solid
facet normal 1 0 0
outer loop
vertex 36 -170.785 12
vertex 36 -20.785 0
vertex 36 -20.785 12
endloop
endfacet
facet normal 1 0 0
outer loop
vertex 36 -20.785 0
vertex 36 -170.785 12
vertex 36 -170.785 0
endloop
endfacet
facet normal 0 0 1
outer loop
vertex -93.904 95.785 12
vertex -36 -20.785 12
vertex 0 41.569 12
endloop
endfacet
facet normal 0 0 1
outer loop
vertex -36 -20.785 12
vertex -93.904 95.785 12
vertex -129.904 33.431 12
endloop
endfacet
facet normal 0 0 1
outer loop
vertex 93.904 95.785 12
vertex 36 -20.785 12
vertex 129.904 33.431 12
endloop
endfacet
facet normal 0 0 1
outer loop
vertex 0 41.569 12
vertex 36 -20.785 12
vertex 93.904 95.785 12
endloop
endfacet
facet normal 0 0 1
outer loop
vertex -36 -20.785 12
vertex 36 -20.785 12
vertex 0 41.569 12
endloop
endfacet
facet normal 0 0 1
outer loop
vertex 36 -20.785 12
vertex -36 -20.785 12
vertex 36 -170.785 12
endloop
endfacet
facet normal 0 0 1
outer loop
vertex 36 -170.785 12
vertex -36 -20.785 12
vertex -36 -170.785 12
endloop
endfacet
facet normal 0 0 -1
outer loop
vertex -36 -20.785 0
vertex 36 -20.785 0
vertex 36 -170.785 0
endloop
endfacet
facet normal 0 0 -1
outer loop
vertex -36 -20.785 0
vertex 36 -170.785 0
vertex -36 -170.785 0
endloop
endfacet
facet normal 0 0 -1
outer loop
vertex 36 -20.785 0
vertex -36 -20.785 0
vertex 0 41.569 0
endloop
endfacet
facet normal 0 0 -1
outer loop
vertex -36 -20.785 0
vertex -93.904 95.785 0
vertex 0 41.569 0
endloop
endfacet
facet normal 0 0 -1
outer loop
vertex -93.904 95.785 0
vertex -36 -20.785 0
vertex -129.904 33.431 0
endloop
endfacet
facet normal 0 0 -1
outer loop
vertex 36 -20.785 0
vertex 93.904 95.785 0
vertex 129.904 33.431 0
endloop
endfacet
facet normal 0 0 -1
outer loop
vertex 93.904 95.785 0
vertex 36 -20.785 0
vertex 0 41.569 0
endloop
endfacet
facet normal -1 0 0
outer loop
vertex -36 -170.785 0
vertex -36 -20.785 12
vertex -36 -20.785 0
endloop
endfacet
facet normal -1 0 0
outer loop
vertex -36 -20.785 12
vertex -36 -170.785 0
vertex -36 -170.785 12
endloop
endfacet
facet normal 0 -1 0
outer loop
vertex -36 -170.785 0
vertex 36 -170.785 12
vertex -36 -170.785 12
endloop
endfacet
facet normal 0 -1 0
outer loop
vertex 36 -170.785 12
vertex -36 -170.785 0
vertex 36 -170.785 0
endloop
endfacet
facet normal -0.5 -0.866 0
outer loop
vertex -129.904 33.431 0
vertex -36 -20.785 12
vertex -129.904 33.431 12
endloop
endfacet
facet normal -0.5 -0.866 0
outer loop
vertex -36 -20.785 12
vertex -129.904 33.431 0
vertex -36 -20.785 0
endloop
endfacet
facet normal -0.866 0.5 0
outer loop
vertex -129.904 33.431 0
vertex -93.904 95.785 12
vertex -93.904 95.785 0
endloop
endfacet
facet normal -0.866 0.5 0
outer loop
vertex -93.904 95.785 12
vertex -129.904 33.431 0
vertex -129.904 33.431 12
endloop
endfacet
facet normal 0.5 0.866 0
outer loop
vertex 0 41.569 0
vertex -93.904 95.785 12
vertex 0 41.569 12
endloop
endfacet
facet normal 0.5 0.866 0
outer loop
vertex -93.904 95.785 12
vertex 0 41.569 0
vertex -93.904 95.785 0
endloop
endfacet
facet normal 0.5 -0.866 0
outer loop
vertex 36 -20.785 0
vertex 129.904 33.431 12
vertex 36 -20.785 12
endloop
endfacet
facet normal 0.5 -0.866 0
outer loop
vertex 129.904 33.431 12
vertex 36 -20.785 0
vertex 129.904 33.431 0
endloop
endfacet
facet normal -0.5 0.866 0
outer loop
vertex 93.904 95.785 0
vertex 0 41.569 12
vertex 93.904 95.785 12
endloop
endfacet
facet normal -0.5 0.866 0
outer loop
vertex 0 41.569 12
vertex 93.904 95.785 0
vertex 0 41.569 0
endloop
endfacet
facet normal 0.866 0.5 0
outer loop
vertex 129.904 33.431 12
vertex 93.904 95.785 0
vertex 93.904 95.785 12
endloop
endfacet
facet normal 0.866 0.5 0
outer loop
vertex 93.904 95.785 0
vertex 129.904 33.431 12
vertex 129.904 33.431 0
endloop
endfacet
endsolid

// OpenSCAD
// file: dims.scad
function i2m(x)=x*25.4;
function ASA(alpha,a,beta) = ((a/sin(alpha))*sin(beta));
//echo("ASA(90, 19.05, 60) == 16.5, but was ", ASA(90,19.05,60));

//Table Height
dim_tableHeight = i2m(29);

//Table Length
dim_tableLength = 2800;

// Table Width
dim_tableWidth = 1000;

// Table top
dim_tableTop = 20;

// Leg gap
dim_legGap = 1800;

// Ply Thickness
dim_ply = 12;

// Ply stack
qty_ply = 6;

//Critical dim
dim_critical = dim_ply * qty_ply;

//Vertical angle
ang_vertical = 10;

//Base thickness
dim_thickness = 80;

//Horizontal angle
ang_horizontal = 120;

// base extension
dim_baseExtension = ASA(ang_horizontal / 2 , dim_critical / 2, 90 - (ang_horizontal / 2 ));

// y brace
dim_yBrace = 150;

// Lower leg length
dim_lowerLeg = 360;

// Lower rad
rad_lower = 100;

// Upper rad
rad_upper = 50;
// main file
// ybrace
include <dims.scad>;

ybrace();

module ybrace(){
	translate([ dim_critical * -0.5, dim_yBrace * -1 - dim_baseExtension, 0])cube([dim_critical, dim_yBrace, dim_ply]);
	rotate([ 0, 0, ang_horizontal * 0.5])translate([ dim_critical * -0.5, -dim_baseExtension, 0])cube([dim_critical, dim_yBrace, dim_ply]);
	rotate([ 0, 0, ang_horizontal * -0.5])translate([ dim_critical * -0.5, -dim_baseExtension, 0])cube([dim_critical, dim_yBrace, dim_ply]);
	
	echo("dim_critical",dim_critical);
	echo("dim_baseExtension",dim_baseExtension);
	echo("dim_baseExtension + dim_critical",dim_baseExtension + dim_critical);


}

module plate(){
	scale([ 2, 1, 2])cube([dim_critical, dim_yBrace, dim_ply]);
}
